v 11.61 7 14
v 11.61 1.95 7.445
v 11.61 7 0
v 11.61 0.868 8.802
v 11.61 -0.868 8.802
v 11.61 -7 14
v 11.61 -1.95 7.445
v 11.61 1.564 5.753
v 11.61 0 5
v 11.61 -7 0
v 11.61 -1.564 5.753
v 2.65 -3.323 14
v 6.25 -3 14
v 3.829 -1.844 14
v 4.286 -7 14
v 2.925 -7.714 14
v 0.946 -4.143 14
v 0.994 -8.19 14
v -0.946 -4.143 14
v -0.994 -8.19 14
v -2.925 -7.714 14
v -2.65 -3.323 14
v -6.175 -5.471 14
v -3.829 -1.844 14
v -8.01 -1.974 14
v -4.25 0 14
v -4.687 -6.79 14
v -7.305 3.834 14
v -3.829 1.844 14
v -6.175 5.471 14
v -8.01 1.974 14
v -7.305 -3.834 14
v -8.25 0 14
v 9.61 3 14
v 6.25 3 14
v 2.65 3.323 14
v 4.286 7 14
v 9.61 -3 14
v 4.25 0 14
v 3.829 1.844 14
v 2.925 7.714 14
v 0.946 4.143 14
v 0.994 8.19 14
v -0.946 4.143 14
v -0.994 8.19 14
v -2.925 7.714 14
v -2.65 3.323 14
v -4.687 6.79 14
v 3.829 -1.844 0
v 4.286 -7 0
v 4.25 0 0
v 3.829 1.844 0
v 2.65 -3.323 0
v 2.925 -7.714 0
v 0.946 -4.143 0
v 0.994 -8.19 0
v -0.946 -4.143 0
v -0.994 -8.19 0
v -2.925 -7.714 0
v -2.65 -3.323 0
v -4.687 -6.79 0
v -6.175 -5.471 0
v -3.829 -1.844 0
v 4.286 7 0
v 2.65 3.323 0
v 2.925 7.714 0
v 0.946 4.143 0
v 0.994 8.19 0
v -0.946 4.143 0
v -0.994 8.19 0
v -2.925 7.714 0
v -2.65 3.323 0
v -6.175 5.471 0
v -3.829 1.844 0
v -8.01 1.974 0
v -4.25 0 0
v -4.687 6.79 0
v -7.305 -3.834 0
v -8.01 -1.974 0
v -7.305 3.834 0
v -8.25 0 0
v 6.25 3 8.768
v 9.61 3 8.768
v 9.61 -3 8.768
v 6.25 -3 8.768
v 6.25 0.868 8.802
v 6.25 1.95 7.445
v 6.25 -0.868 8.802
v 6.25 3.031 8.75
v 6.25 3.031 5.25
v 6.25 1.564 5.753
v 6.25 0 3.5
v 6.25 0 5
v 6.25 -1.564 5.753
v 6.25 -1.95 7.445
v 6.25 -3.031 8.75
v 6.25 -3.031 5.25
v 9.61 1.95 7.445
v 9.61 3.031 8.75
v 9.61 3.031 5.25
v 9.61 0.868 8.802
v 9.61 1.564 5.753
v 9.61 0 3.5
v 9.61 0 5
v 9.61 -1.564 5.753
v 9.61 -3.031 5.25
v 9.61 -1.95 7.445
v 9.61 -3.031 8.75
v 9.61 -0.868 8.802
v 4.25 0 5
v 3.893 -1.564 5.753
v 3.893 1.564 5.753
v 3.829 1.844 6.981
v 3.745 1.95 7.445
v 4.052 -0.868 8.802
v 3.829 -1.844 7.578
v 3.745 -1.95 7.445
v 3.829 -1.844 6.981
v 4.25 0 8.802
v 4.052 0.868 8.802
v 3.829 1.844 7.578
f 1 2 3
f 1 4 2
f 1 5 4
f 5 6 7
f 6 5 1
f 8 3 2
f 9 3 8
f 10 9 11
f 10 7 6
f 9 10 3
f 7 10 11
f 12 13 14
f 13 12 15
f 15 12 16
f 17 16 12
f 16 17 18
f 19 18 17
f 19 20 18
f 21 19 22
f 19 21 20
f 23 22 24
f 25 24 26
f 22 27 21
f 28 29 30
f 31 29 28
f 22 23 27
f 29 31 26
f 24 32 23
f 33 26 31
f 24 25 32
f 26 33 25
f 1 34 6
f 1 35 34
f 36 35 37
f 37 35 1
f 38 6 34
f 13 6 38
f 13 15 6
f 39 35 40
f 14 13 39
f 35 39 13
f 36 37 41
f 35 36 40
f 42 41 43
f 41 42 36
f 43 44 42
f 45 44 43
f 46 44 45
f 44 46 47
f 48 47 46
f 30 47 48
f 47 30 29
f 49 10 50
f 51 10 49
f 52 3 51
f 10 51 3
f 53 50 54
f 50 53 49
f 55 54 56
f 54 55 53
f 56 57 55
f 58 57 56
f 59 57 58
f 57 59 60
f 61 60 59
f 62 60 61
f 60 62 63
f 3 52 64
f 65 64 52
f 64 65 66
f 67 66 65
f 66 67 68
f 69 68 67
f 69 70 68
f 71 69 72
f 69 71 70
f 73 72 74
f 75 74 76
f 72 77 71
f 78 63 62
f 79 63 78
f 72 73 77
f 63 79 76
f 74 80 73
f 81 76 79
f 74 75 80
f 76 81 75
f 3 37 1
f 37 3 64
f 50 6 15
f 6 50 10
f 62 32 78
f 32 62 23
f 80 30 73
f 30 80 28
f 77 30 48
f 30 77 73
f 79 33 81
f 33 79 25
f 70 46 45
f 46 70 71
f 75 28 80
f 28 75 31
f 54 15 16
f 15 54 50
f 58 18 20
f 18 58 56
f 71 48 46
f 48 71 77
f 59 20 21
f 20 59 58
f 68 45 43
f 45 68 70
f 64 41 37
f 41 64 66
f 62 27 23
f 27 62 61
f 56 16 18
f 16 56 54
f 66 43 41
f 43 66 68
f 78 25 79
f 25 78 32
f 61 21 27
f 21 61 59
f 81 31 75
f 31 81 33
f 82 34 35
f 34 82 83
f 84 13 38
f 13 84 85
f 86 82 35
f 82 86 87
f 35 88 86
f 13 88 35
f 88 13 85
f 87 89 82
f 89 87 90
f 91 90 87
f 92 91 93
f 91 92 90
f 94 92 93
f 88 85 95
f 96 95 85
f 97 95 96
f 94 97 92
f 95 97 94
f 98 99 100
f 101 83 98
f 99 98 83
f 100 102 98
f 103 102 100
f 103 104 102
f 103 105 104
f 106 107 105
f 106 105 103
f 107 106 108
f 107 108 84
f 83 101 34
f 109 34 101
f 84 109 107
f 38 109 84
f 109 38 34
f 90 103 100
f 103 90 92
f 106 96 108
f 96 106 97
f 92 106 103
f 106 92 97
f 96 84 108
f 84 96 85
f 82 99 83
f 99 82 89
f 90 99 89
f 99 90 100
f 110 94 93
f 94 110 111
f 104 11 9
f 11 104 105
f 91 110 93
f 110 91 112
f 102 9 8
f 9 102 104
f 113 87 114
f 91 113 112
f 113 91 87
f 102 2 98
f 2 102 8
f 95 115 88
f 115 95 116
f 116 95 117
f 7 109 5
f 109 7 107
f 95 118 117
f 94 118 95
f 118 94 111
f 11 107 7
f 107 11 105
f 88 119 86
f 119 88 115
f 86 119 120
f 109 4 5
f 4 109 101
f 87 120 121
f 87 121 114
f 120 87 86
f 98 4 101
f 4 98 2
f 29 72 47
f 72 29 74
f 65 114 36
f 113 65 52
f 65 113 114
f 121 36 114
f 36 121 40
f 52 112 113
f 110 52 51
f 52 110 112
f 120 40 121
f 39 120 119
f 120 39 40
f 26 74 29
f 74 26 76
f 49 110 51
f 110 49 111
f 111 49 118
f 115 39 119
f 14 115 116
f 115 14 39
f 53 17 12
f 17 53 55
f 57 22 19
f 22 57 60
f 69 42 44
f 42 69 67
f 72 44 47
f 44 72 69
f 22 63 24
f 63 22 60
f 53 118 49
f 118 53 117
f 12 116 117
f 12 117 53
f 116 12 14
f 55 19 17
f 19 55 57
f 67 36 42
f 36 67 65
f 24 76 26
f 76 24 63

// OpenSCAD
//CUSTOMIZER VARIABLES

/* [Basic_Parameters] */

// Support rod diameter, in mm
rod_diameter = 8.0;  // [3:0.1:40]

// Bolt diameter, in mm
bolt_diameter = 3.0;    // [2:0.1:20]

// Nut diameter, in mm
nut_diameter = 6.0;  // [3:0.1:40]

// Nut thickness, in mm
nut_thickness = 2.8;  // [2:0.1:30]

// margin around the rod, in mm
rod_margin = 4; // [2:40]

//CUSTOMIZER VARIABLES END

// Sanity checks
if( rod_diameter <= 0
    || bolt_diameter <= 0 || nut_diameter <= 0 || nut_thickness <= 0)
{
    echo("<B>Error: Missing important parameters</B>");
}

if(nut_diameter<=bolt_diameter)
{
    echo("<B>Error: Nut size too small for bolt</B>");
}

// how much extra space to allow in nut trap
nut_space_factor = 1.2;

// z depth
main_depth= max( 10, nut_diameter+2*rod_margin );

nut_trap_len = nut_thickness*nut_space_factor;

// our object, translated to be flat on xy plane for easy STL generation
translate([0,0,main_depth/2])
    optics_clamp();

module optics_clamp(){

    bolt_rad= (bolt_diameter+1)/2;  // this should be sorta loose
    rod_rad= (rod_diameter+0.5)/2;  // should be almost tight
    clamp_rad = rod_rad + rod_margin;

    main_width= rod_rad + rod_margin + nut_trap_len;
    main_height= nut_diameter + 2*rod_margin;
    
    rod_x= 0;
    nut_x= rod_x + rod_rad + rod_margin/2;
    nut_y = 0;
    
    rod_length= main_depth + 20;
    
    difference() {

        union() {
          // the main block
          block_x = main_width/2;
          translate([block_x,0,0])
            cube([main_width,main_height,main_depth],center = true);
            
        translate([0,0,0])
            cylinder(main_depth,clamp_rad,clamp_rad,center=true);
        }

    // rod clamp nut and bolt hole
      translate([nut_x,nut_y,0])
        rotate([0,0,90])
          nuttrap();
      translate([rod_x,nut_y,0])
        rotate([0,90,0])
          cylinder(main_width*2,bolt_rad,bolt_rad);

    // the support rod
#   color("green")
      translate([rod_x,0,-rod_length/2])
        cylinder(rod_length,rod_rad,rod_rad);
    }
}

module hexagon(height,radius) 
{
  linear_extrude(height)
    circle(radius,$fn=6);
}

module nuttrap(){
  translate([0,-nut_trap_len/2,main_depth/2])
    cube([nut_diameter,nut_trap_len,main_depth],center =true);
  rotate([90,360/12,0]) // so point is down, nut trapped by straight sides
    hexagon(nut_trap_len,(nut_diameter+1)/2);
}
